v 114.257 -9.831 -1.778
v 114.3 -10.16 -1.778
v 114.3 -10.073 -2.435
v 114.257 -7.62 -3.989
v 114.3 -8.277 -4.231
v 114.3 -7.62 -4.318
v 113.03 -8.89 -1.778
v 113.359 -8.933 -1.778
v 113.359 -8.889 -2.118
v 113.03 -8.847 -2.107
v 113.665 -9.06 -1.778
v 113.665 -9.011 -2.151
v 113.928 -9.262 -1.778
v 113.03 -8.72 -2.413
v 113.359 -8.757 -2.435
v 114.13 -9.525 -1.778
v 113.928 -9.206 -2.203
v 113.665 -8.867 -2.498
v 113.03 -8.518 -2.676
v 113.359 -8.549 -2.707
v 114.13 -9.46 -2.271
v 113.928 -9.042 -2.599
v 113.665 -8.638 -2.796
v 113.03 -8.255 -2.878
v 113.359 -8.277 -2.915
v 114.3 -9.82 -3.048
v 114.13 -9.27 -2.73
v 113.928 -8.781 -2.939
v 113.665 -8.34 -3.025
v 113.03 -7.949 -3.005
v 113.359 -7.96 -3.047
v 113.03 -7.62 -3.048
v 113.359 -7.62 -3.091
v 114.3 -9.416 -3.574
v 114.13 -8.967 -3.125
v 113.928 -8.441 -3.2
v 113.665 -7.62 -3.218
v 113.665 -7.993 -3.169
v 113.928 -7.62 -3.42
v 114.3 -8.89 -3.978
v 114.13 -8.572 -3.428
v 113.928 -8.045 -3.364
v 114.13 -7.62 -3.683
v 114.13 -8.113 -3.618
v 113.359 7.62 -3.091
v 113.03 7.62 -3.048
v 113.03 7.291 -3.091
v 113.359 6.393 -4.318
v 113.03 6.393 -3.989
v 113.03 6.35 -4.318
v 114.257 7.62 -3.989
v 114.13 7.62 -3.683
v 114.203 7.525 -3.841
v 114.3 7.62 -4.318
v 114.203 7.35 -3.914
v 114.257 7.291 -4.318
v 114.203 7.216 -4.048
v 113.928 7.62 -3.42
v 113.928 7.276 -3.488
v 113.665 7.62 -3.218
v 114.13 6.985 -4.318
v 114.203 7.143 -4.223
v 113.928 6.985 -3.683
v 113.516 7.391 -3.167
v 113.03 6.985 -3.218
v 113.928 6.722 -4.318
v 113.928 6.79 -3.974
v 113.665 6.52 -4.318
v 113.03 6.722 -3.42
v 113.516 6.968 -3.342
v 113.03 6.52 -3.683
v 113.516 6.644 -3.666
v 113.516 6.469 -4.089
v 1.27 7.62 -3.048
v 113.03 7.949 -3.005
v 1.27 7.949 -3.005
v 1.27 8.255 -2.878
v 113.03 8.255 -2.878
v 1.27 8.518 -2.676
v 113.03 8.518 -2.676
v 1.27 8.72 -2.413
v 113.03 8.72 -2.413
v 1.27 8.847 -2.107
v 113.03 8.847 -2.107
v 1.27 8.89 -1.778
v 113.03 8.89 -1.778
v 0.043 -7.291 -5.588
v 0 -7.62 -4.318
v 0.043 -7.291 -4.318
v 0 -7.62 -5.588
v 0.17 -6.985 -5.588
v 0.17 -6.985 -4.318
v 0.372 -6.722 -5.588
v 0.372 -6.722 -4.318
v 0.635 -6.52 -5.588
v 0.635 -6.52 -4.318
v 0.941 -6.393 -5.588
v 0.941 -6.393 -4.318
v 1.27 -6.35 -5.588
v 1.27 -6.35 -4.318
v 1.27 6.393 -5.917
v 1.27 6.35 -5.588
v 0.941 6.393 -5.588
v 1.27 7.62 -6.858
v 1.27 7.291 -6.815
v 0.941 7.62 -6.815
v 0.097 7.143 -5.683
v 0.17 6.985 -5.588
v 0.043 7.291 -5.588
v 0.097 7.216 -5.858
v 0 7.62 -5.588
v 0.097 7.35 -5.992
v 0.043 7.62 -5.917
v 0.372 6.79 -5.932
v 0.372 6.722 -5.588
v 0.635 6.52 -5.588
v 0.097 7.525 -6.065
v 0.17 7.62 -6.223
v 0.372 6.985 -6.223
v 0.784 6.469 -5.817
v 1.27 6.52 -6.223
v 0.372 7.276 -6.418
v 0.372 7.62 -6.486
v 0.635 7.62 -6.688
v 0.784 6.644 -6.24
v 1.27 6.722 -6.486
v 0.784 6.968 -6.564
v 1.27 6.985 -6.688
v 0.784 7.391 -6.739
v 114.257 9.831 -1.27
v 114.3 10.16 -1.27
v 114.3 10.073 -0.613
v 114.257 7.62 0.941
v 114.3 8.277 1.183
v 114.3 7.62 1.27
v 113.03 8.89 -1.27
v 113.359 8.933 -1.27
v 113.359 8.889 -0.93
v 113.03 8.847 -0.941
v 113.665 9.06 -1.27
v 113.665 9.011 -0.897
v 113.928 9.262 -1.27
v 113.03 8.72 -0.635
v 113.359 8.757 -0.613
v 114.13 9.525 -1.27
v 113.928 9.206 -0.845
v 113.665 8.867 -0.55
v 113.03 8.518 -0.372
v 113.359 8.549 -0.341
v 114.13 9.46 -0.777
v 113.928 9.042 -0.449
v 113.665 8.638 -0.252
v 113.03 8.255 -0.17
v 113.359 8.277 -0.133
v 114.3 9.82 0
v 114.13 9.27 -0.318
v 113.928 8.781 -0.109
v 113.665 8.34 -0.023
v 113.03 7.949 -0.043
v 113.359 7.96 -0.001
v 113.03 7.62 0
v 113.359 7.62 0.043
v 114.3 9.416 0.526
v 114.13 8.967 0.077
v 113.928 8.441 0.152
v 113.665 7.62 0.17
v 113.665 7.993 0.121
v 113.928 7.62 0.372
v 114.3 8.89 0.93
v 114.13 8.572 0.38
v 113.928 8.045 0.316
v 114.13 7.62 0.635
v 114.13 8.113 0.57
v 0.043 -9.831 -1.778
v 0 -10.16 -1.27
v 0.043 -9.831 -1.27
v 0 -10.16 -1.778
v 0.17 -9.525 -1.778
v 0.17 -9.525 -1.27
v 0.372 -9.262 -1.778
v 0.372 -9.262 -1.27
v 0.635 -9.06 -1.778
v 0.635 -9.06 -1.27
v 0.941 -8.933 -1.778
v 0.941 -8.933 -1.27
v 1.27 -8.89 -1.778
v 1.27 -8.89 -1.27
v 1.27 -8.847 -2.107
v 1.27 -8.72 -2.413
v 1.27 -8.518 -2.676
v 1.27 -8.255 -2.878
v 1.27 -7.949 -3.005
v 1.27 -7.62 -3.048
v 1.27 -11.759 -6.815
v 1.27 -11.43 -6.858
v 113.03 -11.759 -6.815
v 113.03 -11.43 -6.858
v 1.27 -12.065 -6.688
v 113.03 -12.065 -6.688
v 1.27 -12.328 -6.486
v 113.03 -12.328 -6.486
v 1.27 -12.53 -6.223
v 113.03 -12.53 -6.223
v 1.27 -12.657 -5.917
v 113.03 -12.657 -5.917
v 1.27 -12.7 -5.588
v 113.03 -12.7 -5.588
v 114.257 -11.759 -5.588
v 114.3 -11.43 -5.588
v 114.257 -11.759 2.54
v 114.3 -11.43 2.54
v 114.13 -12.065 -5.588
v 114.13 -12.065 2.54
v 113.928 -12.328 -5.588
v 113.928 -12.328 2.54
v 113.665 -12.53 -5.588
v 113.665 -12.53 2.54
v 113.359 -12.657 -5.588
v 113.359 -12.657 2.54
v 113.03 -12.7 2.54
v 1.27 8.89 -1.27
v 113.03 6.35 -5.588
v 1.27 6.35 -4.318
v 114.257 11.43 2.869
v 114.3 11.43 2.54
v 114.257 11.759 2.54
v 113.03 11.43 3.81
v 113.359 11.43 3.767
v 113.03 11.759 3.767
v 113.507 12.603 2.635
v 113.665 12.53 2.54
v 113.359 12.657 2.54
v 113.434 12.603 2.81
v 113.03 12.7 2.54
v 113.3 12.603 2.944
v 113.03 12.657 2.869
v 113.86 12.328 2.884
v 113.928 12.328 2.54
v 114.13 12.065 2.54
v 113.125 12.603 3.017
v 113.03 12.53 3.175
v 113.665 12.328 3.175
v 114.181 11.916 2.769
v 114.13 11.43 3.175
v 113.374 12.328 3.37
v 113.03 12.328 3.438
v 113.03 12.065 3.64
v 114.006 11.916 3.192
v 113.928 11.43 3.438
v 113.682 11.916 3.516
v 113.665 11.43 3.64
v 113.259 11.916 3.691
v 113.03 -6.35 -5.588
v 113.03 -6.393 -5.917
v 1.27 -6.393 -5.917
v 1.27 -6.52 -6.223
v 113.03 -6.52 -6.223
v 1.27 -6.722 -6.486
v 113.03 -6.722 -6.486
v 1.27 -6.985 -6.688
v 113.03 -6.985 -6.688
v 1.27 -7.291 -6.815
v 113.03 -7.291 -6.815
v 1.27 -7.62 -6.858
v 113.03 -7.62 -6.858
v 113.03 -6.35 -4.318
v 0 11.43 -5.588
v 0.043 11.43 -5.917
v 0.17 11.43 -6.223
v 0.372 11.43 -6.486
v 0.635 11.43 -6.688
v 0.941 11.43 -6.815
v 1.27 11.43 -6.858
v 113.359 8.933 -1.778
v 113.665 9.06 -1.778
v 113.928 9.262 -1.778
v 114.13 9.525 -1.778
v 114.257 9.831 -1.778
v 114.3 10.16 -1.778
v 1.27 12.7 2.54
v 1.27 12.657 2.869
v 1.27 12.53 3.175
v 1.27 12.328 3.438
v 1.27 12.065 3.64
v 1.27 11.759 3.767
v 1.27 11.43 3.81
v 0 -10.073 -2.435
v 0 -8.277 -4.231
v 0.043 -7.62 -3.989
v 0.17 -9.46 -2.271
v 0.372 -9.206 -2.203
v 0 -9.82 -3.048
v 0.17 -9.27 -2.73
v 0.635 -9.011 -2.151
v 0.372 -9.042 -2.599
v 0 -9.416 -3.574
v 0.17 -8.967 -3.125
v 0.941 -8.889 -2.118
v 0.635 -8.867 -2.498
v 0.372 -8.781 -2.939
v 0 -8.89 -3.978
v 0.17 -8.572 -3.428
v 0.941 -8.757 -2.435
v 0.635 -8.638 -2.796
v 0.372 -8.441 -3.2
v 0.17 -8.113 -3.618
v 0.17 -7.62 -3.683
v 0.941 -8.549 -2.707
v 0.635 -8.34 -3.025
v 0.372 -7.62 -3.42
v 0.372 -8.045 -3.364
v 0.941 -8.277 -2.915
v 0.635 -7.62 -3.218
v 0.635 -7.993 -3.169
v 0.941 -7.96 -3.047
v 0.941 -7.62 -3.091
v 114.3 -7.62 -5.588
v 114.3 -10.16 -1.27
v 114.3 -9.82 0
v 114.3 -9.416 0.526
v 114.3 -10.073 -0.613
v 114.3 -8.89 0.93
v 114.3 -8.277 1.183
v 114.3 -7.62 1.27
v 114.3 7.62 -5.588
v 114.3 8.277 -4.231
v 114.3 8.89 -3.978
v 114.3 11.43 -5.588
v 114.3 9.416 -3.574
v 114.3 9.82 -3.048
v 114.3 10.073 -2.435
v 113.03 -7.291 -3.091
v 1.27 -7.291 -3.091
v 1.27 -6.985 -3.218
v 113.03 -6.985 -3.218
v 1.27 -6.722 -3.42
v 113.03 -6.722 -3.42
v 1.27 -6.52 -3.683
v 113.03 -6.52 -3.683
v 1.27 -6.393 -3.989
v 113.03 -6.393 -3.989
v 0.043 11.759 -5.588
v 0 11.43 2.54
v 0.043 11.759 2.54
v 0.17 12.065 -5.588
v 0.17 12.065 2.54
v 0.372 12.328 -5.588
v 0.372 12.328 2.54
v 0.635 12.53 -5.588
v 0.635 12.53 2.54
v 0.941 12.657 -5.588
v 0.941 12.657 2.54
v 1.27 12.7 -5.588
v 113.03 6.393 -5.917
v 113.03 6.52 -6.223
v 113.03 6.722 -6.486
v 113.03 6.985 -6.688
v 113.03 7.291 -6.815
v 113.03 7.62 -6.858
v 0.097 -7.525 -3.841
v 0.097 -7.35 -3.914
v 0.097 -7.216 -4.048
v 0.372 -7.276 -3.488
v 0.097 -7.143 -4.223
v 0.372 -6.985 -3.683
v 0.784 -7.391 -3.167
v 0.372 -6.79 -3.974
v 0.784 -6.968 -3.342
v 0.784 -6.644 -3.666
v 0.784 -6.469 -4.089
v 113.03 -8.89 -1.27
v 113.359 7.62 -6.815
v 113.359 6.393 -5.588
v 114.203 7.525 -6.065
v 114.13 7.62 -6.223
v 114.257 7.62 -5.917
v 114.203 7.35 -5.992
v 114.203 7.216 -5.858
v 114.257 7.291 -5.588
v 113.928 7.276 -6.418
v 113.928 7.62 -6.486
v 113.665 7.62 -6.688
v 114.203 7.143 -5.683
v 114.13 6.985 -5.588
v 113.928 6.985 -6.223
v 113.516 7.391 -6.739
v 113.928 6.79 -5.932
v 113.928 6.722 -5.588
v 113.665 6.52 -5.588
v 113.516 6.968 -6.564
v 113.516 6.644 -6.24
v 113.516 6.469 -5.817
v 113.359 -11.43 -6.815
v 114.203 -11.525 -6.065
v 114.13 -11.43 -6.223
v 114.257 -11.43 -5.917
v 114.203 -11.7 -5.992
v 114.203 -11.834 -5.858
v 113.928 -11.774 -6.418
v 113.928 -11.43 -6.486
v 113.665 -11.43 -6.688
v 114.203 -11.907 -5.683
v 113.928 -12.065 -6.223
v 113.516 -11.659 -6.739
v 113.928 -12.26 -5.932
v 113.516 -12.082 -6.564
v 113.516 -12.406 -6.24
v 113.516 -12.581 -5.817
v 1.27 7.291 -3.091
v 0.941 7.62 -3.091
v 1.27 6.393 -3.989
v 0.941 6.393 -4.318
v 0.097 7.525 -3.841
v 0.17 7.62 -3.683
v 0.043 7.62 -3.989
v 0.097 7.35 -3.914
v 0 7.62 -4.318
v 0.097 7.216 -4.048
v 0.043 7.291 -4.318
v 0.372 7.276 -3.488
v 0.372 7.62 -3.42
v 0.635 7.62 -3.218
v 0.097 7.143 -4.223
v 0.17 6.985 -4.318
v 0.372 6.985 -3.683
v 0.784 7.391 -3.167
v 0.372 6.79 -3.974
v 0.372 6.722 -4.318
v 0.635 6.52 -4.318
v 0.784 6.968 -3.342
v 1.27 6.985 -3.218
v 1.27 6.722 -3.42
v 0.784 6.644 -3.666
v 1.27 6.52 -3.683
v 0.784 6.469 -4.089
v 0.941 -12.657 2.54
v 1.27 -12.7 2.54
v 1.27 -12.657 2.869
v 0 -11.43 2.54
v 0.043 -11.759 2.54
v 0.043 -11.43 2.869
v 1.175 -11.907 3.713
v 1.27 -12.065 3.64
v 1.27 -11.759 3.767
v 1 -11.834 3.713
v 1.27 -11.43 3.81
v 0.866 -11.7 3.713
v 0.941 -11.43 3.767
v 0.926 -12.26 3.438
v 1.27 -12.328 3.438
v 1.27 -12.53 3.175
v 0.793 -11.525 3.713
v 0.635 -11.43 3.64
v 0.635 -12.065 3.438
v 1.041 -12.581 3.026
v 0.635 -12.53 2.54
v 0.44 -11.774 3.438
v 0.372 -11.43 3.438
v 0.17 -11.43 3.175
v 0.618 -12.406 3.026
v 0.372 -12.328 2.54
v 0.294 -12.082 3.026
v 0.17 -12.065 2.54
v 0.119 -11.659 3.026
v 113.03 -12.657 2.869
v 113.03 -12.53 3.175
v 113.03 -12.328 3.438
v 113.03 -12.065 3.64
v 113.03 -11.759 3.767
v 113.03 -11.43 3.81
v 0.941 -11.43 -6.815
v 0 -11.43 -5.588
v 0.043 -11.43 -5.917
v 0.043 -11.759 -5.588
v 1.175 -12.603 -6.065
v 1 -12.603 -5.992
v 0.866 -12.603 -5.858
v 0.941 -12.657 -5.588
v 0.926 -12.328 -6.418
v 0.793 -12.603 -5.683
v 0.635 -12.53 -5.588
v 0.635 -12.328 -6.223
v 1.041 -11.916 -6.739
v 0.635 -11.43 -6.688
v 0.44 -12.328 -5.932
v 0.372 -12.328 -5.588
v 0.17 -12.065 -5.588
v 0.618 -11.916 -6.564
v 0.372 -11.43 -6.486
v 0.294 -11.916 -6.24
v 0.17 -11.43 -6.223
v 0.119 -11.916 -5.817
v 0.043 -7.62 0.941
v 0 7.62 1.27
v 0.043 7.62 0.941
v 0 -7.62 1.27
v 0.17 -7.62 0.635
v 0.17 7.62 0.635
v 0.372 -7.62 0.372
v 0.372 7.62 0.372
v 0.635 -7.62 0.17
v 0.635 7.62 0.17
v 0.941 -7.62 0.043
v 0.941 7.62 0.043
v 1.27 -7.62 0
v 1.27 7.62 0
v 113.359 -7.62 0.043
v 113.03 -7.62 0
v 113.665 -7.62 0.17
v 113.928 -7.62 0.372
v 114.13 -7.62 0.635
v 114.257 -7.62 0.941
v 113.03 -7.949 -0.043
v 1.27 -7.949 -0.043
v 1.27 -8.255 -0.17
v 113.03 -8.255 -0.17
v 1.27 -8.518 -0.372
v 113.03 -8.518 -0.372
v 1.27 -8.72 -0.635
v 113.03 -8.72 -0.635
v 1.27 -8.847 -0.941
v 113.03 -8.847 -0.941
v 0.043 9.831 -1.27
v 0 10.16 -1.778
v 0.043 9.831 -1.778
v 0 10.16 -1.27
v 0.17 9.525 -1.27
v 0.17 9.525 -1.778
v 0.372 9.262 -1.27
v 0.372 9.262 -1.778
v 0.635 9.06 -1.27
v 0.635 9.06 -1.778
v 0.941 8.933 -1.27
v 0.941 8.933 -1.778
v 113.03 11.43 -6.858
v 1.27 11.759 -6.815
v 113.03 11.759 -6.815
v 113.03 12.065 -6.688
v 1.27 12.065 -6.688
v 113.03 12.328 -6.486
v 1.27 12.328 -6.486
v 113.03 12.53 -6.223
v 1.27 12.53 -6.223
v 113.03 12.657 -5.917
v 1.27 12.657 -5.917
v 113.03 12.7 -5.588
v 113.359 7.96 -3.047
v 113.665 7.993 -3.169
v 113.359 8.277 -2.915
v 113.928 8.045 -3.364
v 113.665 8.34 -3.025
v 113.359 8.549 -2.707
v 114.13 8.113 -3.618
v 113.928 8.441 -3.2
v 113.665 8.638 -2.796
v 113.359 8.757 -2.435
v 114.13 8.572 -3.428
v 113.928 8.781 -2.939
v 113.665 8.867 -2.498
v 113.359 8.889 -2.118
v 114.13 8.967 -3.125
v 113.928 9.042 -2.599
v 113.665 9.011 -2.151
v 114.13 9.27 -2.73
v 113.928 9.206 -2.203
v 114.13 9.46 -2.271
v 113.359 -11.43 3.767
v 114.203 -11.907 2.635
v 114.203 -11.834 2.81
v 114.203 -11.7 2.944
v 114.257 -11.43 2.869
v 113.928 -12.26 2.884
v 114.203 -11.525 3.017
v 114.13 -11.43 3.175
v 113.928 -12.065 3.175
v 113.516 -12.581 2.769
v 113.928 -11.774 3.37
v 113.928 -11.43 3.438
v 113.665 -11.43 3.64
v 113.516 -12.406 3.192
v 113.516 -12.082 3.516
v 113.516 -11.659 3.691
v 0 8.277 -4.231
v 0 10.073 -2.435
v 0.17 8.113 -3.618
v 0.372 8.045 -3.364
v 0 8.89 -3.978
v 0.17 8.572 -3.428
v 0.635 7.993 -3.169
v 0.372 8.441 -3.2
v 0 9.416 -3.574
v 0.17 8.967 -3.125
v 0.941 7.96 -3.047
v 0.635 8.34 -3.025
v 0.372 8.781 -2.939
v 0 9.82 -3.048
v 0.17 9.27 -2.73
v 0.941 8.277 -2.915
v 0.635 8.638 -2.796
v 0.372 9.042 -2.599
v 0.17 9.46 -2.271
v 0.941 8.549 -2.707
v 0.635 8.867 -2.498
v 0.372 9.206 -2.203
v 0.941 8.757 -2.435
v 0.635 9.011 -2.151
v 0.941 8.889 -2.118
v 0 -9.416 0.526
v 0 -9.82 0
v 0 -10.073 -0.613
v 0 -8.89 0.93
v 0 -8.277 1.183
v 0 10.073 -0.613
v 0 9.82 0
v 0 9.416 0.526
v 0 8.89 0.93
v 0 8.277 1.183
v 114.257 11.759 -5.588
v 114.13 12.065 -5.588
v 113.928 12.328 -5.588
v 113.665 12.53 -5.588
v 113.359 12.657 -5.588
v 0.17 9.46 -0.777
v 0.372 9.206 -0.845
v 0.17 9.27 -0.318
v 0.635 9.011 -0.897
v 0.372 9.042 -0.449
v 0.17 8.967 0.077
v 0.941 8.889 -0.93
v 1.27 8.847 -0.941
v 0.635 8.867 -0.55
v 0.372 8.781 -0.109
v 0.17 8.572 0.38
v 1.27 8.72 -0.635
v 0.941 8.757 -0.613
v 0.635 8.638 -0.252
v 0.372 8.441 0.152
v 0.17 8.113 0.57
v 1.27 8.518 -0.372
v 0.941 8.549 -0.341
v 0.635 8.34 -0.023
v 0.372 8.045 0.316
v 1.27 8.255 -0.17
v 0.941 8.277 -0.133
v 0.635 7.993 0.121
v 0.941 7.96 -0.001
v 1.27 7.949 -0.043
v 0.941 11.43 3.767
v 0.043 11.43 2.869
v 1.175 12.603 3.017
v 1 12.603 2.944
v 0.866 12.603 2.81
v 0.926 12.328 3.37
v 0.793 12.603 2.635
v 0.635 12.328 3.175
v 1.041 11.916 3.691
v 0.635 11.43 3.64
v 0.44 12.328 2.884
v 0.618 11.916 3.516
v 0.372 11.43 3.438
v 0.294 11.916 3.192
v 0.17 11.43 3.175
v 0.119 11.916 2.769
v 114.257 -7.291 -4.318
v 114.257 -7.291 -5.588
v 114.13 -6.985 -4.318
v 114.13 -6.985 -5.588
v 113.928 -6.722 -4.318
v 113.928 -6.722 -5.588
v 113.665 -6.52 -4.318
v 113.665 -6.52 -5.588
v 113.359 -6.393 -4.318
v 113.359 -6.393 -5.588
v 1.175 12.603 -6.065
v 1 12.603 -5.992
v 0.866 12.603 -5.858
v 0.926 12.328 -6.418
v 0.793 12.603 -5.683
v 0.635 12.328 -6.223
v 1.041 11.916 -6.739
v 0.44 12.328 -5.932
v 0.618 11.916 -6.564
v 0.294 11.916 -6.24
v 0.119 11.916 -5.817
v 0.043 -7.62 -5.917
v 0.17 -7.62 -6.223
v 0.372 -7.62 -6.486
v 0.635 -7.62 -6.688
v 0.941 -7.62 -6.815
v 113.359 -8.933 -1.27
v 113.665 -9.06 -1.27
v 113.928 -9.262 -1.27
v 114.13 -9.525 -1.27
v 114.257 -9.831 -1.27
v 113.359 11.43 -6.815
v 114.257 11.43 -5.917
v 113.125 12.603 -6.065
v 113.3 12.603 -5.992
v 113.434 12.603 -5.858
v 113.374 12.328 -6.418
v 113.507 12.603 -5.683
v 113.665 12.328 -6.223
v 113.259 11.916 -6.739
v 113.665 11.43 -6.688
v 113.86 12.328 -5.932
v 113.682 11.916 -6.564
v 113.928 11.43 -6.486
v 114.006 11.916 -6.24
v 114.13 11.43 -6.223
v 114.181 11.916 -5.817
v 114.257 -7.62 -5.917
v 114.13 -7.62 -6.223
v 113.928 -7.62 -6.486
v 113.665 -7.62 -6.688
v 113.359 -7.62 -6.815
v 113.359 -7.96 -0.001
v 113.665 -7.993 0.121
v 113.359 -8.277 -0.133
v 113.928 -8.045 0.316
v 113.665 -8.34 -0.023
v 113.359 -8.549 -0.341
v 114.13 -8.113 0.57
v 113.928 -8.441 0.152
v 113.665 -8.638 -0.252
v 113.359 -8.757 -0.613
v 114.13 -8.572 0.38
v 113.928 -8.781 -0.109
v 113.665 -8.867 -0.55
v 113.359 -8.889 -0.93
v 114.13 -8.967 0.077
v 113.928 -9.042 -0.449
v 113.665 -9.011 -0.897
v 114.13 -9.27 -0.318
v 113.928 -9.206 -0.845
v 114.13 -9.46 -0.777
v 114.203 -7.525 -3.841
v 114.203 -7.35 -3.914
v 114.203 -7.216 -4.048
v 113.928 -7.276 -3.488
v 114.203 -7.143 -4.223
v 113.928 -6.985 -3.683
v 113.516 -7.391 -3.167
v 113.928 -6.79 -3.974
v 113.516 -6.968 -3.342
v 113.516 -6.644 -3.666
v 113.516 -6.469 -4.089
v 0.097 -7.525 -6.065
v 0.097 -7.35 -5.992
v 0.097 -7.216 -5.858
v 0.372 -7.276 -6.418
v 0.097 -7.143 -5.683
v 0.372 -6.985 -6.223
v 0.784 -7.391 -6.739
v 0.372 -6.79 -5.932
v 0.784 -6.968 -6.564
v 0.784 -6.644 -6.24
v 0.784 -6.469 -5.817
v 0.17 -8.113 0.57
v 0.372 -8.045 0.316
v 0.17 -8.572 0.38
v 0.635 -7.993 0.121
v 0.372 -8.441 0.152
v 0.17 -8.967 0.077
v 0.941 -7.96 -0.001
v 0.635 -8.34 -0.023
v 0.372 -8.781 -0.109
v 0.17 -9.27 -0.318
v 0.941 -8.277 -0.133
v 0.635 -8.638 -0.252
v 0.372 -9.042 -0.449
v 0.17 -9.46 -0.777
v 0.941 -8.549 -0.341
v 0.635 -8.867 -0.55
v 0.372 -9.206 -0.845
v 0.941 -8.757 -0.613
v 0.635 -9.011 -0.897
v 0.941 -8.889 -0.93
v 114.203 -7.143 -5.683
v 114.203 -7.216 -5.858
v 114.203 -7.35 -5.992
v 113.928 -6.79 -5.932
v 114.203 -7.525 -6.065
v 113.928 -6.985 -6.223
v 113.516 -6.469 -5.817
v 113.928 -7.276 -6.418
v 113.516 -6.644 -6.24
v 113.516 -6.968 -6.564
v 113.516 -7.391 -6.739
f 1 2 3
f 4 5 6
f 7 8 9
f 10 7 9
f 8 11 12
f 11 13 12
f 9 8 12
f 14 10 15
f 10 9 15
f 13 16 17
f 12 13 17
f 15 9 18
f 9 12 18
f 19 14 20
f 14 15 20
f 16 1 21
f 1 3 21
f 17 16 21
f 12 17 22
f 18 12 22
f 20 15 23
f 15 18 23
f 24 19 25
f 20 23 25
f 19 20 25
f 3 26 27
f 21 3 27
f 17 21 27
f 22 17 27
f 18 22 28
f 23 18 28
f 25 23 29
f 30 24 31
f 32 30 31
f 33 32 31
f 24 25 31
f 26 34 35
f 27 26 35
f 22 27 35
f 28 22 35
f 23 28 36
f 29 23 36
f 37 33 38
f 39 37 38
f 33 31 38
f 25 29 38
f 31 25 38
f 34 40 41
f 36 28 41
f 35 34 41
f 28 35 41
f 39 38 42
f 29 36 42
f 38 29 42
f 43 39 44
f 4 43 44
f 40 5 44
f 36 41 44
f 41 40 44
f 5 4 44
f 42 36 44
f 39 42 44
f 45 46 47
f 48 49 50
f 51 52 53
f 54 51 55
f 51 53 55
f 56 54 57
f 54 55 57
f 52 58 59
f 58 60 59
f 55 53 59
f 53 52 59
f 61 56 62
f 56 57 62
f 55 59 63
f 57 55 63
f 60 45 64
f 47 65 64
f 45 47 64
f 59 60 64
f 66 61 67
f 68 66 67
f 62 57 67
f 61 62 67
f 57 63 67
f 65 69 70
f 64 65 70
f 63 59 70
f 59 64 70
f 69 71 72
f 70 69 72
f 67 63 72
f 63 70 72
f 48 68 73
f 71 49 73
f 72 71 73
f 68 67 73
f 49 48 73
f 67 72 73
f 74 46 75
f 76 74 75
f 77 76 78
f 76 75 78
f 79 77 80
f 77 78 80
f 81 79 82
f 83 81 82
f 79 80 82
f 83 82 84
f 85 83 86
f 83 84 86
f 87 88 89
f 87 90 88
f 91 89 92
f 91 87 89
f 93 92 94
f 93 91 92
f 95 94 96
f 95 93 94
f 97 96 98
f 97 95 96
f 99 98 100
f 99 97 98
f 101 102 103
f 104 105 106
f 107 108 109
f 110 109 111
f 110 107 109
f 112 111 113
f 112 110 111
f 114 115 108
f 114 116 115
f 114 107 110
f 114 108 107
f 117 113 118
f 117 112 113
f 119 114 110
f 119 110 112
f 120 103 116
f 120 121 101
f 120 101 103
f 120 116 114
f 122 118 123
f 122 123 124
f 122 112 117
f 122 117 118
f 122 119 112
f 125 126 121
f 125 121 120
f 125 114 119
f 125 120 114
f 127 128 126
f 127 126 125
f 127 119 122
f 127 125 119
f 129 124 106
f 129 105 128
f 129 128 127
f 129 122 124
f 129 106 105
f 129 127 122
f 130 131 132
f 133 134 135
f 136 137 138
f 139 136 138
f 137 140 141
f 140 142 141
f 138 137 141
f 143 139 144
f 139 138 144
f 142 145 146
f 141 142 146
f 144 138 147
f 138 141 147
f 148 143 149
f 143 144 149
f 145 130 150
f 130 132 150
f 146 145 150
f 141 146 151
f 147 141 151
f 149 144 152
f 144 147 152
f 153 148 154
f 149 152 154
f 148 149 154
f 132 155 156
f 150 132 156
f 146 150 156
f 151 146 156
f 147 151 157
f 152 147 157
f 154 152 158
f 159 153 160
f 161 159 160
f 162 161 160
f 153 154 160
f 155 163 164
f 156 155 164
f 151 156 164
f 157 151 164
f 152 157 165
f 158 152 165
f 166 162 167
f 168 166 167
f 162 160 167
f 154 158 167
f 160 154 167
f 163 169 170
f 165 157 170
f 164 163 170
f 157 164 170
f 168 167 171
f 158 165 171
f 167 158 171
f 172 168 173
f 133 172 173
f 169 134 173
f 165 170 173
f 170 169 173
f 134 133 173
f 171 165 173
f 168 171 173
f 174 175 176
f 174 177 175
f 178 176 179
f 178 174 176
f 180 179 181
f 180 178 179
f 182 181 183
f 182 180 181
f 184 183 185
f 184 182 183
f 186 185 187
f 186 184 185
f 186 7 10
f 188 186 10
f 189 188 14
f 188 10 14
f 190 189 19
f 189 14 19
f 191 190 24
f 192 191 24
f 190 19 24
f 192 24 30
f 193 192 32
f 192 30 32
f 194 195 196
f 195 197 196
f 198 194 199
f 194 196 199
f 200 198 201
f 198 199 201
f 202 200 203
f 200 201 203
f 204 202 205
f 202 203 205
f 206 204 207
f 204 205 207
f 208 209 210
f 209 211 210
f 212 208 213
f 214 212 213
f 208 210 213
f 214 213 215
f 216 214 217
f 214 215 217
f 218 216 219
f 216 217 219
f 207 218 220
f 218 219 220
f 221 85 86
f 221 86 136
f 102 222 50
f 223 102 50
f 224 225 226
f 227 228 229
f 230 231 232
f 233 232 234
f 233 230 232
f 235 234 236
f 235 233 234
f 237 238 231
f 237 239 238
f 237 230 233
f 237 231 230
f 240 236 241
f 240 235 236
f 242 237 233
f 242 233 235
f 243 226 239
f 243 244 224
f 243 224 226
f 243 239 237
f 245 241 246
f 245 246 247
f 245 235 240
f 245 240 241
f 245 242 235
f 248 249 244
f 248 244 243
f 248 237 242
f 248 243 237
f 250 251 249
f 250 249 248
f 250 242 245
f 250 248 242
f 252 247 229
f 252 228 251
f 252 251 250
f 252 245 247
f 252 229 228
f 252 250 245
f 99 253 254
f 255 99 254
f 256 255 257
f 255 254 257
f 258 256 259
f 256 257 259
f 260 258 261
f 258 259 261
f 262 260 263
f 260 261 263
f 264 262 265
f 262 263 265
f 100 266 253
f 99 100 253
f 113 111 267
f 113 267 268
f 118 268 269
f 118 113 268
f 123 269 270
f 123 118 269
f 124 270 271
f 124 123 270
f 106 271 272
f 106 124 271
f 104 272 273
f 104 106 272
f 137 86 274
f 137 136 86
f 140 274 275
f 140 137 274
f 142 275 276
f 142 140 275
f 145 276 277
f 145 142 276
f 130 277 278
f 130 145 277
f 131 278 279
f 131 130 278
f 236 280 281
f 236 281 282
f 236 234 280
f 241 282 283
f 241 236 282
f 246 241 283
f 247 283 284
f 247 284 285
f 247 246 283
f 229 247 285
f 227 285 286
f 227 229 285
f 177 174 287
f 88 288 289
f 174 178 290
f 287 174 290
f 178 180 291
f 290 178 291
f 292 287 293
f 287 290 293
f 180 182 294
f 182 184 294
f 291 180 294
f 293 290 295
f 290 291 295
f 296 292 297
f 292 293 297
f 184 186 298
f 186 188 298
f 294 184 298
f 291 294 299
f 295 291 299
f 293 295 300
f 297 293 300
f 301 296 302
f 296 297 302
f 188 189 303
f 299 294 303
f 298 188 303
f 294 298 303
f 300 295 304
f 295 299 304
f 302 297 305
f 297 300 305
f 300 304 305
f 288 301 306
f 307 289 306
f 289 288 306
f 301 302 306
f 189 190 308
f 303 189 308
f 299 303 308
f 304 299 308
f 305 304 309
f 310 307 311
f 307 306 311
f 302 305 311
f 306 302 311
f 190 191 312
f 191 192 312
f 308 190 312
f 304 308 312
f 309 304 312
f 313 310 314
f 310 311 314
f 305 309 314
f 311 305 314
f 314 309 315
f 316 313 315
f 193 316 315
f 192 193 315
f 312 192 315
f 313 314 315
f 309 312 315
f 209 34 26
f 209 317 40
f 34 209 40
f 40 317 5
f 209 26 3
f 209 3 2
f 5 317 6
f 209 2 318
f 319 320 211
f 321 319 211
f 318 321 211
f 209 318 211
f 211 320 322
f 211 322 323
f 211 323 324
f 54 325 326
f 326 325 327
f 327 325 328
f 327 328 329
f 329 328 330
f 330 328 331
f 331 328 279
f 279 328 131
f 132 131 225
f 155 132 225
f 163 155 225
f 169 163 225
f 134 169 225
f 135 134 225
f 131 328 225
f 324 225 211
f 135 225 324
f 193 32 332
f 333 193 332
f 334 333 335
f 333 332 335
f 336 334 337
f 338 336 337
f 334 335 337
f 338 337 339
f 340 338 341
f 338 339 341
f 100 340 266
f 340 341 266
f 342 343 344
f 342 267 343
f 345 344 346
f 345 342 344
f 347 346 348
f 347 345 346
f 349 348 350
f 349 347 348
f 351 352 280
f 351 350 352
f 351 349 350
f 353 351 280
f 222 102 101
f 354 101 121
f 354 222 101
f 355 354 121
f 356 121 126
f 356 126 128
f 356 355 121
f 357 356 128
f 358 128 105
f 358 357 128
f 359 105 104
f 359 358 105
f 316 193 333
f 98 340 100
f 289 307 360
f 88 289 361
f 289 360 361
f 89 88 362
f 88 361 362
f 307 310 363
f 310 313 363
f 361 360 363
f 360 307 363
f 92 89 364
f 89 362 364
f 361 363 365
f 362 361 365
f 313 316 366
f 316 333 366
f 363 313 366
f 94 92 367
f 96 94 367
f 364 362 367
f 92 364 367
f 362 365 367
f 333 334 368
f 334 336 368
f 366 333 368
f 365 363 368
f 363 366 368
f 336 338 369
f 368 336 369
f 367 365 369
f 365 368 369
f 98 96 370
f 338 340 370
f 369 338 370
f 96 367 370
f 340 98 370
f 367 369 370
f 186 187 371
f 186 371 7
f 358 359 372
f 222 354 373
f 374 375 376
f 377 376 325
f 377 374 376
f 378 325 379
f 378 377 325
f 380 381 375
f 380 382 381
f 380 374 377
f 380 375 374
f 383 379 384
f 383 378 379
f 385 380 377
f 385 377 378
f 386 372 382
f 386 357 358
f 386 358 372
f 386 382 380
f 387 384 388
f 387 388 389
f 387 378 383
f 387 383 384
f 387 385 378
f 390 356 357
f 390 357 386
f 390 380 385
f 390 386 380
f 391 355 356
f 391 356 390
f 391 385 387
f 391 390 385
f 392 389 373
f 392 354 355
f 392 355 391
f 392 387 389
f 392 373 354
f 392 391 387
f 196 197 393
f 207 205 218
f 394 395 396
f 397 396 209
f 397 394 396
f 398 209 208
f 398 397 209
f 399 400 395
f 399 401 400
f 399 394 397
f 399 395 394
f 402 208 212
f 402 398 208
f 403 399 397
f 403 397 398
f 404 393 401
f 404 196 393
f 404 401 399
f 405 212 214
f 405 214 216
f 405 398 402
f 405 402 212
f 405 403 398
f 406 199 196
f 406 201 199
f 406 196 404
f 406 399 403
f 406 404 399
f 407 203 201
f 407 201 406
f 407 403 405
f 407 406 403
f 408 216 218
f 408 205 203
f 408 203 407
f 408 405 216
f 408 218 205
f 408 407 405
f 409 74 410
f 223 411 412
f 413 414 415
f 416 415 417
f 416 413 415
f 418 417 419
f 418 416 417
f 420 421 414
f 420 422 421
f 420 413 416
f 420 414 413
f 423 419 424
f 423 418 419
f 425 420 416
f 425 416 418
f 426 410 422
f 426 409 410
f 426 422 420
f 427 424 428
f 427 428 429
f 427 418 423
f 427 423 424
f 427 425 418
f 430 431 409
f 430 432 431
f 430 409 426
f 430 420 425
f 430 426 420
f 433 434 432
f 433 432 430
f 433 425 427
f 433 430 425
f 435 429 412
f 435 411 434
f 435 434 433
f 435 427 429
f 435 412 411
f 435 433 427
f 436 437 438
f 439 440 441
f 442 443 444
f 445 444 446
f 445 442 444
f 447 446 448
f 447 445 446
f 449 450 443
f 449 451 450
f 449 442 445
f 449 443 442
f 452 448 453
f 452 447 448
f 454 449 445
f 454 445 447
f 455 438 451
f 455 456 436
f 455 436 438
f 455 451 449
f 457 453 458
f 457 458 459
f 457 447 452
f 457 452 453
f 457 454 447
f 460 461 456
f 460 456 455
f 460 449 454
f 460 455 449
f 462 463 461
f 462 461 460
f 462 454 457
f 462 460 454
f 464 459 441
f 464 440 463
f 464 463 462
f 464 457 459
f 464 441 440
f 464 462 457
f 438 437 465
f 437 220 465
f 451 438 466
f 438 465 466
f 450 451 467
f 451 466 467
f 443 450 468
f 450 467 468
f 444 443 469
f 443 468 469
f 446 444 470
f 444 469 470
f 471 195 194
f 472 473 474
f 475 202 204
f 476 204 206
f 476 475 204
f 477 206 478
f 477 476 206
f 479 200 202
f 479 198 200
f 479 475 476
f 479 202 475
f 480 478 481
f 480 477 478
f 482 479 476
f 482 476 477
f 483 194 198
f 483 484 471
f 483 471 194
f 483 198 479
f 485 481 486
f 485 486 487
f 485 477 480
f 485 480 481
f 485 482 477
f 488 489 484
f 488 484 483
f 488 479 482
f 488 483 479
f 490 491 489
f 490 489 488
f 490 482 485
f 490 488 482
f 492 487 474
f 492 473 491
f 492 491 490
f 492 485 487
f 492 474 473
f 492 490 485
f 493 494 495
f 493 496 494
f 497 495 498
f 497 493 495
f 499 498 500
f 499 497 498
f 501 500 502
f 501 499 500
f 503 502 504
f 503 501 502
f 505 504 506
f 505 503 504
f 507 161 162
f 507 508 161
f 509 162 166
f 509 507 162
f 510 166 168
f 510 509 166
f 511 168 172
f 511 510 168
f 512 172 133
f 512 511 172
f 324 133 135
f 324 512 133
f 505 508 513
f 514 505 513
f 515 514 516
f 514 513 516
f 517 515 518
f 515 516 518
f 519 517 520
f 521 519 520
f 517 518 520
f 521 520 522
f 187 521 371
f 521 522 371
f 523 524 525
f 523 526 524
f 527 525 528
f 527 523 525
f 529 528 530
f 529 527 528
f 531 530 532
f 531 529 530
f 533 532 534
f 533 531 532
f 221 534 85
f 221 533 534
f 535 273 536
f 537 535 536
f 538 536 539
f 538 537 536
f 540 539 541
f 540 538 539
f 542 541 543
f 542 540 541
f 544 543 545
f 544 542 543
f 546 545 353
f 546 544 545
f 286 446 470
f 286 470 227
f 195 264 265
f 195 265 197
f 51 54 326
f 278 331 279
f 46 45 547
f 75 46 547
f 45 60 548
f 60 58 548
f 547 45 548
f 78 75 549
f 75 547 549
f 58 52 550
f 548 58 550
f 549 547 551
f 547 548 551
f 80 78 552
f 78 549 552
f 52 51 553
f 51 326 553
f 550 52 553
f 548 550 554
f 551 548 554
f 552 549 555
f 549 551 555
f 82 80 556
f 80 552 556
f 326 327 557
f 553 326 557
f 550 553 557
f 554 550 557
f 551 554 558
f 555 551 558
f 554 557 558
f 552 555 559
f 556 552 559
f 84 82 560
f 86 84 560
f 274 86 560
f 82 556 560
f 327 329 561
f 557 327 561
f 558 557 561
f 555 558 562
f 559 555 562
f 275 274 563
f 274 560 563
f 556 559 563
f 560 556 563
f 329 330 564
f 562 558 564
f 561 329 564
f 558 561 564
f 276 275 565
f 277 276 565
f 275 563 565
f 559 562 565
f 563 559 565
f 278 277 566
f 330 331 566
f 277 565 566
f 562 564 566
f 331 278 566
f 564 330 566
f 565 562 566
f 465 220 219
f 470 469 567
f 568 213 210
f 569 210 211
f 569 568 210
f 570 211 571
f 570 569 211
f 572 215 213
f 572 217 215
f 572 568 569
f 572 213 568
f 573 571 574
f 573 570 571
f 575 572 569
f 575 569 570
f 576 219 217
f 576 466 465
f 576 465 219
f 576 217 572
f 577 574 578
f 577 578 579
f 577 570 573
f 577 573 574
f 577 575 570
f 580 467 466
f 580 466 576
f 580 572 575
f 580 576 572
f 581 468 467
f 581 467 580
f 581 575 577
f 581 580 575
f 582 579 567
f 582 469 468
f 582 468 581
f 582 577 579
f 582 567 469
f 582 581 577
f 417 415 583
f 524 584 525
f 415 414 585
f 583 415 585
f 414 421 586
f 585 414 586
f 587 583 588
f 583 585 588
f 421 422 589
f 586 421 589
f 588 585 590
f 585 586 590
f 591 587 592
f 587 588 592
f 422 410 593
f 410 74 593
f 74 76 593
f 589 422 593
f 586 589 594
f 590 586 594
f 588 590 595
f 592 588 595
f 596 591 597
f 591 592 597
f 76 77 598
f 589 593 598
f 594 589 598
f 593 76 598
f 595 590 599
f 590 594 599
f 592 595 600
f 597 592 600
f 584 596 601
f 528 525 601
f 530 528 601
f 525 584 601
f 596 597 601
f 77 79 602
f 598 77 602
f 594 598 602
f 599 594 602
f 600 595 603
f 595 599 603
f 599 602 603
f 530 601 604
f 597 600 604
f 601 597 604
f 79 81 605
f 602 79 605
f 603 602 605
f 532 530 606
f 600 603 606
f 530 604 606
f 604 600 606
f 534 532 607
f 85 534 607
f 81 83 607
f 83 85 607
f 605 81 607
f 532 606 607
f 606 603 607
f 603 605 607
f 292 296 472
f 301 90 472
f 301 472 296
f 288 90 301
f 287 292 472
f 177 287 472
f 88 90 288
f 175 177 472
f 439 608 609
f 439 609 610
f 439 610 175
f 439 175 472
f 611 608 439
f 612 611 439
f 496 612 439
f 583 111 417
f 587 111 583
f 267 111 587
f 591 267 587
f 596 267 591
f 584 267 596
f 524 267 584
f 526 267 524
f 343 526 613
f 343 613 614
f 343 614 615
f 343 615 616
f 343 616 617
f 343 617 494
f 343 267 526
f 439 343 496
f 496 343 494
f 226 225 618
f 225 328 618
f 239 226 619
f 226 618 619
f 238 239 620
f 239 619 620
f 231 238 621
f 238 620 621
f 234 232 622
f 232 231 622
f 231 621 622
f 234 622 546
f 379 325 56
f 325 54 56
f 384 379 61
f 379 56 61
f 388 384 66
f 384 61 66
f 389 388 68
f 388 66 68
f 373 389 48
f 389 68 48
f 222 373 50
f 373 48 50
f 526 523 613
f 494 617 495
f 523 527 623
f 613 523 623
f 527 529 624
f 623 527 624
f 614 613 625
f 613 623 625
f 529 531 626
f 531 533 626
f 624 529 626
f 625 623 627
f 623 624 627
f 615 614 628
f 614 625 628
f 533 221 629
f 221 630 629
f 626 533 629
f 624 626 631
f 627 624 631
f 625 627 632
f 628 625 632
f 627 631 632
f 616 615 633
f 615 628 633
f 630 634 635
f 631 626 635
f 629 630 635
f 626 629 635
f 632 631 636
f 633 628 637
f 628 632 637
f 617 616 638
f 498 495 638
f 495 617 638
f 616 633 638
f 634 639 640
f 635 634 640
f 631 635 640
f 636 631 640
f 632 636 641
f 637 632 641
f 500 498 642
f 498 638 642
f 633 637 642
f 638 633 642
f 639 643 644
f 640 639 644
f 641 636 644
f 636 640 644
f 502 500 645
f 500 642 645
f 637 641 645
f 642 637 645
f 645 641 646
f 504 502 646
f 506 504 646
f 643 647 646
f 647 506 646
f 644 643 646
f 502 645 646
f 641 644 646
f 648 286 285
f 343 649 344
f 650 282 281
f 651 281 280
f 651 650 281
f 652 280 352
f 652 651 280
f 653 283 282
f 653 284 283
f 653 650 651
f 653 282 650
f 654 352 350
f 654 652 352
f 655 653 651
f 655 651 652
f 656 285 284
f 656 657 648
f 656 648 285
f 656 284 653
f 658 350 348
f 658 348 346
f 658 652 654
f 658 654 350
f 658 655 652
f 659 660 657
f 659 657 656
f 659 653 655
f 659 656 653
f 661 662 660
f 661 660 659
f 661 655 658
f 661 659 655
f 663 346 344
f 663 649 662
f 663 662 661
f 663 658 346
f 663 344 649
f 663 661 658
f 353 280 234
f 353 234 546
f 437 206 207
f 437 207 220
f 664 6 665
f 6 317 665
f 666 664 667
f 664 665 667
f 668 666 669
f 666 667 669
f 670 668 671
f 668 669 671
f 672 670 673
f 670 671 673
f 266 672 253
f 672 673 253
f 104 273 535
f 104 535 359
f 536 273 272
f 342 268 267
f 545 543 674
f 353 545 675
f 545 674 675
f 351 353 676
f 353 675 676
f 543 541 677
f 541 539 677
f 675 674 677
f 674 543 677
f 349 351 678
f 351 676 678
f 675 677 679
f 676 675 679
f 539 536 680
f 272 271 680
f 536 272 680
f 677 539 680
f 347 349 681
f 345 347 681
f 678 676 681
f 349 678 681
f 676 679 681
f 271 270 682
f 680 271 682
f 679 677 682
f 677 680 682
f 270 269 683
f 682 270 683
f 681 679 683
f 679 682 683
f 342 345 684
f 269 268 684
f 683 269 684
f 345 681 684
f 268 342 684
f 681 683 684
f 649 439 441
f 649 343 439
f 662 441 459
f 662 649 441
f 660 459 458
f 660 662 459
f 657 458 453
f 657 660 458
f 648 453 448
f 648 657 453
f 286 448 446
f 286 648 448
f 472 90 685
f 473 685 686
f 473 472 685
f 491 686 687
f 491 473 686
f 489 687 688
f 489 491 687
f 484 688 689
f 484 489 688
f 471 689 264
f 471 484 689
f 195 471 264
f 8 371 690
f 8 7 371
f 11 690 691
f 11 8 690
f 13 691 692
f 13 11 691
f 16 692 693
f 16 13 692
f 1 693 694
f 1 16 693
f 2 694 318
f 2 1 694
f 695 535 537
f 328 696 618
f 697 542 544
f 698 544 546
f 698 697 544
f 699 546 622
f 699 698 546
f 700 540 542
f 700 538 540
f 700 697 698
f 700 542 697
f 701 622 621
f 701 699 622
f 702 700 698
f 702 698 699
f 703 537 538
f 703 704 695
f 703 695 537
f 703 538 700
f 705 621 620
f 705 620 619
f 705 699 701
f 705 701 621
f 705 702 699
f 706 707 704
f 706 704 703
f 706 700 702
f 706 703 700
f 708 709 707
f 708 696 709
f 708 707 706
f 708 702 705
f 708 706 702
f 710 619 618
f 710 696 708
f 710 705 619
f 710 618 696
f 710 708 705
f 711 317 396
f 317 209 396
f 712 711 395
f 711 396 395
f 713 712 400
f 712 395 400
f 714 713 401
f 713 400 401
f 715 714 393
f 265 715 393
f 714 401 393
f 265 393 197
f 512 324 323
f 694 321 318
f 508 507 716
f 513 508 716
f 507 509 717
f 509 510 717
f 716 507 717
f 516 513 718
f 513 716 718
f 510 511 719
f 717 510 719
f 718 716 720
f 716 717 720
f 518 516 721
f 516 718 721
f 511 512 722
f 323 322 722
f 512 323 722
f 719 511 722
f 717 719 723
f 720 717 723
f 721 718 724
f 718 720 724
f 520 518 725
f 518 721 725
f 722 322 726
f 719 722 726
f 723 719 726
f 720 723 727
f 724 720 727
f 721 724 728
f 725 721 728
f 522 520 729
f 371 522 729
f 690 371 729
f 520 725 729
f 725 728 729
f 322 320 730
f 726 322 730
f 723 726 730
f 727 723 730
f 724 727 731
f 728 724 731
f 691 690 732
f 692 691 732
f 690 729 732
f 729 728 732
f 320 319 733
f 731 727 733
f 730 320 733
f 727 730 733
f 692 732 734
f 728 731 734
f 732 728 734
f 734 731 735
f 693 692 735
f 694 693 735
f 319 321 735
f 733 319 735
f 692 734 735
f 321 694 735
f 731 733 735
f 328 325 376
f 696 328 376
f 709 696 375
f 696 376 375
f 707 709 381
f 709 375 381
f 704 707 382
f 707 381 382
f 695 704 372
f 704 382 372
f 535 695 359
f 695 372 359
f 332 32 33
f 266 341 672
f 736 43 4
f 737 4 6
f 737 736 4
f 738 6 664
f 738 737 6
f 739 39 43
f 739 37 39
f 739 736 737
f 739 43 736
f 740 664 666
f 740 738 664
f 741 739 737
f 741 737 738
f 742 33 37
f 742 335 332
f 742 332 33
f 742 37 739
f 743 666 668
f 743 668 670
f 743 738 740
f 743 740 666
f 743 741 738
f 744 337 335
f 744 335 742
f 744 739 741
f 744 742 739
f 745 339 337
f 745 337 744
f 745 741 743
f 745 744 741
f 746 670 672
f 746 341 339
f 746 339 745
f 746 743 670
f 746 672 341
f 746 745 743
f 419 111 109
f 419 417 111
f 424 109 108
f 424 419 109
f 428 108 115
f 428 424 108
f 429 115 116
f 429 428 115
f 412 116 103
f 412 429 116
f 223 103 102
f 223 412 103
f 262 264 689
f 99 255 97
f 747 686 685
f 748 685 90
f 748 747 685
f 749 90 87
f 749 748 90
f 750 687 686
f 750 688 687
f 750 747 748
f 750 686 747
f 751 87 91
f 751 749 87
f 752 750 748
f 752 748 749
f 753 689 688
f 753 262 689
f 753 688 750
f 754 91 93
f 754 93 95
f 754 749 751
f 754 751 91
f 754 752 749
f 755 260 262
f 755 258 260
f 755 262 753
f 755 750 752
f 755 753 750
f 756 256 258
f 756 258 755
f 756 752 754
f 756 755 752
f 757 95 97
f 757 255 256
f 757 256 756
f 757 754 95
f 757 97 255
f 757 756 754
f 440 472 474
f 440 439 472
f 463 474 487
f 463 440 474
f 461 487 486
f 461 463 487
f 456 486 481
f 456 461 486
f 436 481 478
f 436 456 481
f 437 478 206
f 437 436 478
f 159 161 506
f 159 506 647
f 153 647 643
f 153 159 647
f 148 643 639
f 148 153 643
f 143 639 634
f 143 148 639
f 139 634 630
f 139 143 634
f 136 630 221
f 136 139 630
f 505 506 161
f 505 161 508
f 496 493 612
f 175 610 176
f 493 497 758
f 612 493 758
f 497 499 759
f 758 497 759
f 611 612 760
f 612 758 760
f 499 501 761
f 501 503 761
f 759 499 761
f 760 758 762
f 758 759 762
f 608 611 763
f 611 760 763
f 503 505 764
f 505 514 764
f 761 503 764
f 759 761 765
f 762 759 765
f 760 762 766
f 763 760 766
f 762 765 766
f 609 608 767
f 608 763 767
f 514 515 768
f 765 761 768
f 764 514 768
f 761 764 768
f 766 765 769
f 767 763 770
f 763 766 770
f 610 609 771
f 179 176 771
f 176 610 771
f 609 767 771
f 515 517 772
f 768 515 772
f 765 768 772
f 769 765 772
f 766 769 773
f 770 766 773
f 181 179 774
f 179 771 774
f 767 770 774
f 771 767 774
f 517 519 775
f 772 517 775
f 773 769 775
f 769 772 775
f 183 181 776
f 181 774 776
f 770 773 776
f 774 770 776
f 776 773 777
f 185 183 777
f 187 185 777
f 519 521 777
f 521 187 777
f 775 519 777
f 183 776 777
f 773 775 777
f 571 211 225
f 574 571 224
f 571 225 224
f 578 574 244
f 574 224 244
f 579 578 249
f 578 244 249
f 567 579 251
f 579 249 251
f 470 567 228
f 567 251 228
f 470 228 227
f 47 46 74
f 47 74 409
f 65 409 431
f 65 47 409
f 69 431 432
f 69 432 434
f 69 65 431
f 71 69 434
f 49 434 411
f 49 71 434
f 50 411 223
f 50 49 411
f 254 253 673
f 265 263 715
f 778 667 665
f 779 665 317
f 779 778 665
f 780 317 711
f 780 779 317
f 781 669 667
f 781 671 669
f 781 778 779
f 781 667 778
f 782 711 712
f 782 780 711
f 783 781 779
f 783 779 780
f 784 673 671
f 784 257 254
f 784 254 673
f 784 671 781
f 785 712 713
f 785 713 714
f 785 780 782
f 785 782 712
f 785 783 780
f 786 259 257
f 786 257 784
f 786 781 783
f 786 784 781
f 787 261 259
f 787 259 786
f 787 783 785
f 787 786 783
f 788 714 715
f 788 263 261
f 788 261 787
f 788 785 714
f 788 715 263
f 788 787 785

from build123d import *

# Parameters (mm, degrees)
BOSS_EXTRUDE1_DEPTH = 114.3
FILLET1_R           = 1.27
FILLET2_R           = 1.27


with BuildPart() as part:
    # Sketch1 → Boss-Extrude1 (new body)
    with BuildSketch(Plane(origin=(0, 0, 0), x_dir=(0, 0, -1), z_dir=(1, 0, 0))):
        Polygon((0, 8.89), (0, -8.89), (3.048, -8.89), (3.048, -6.35), (6.858, -6.35), (6.858, -12.7), (-3.81, -12.7), (-3.81, 12.7), (6.858, 12.7), (6.858, 6.35), (3.048, 6.35), (3.048, 8.89), align=None)
    extrude(amount=BOSS_EXTRUDE1_DEPTH)

    # Fillet1
    fillet1_edges = [part.edges().sort_by_distance(p)[0] for p in [
        (57.15, 8.89, 0),
        (57.15, -8.89, 0),
        (57.15, -8.89, -3.048),
        (57.15, 8.89, -3.048),
    ]]
    fillet(fillet1_edges, radius=FILLET1_R)

    # Fillet2
    fillet2_edges = [part.edges().sort_by_distance(p)[0] for p in [
        (57.15, 6.35, -3.048),
        (57.15, -6.35, -6.858),
        (57.15, 6.35, -6.858),
        (57.15, -6.35, -3.048),
        (0, 8.518025612, -2.676025612),
        (0, 6.35, -4.953),
        (0, 9.525, -6.858),
        (0, -9.525, -6.858),
        (0, -6.35, -4.953),
        (0, -8.518025612, -2.676025612),
        (0, -8.89, -1.524),
        (0, -8.518025612, -0.371974388),
        (0, 0, 0),
        (0, 8.518025612, -0.371974388),
        (0, 8.89, -1.524),
        (57.15, -12.7, -6.858),
        (0, -12.7, -1.524),
        (57.15, -12.7, 3.81),
        (0, 0, 3.81),
        (114.3, -8.518025612, -0.371974388),
        (114.3, -8.89, -1.524),
        (114.3, -8.518025612, -2.676025612),
        (114.3, -6.35, -4.953),
        (114.3, -9.525, -6.858),
        (114.3, -12.7, -1.524),
        (114.3, 0, 3.81),
        (114.3, 9.525, -6.858),
        (114.3, 6.35, -4.953),
        (114.3, 8.518025612, -2.676025612),
        (114.3, 8.89, -1.524),
        (114.3, 8.518025612, -0.371974388),
        (114.3, 0, 0),
        (57.15, 12.7, -6.858),
        (114.3, 12.7, -1.524),
        (57.15, 12.7, 3.81),
        (0, 12.7, -1.524),
    ]]
    fillet(fillet2_edges, radius=FILLET2_R - 0.0001)  # a hair under: the kernel refuses the full size


solid = part.part
